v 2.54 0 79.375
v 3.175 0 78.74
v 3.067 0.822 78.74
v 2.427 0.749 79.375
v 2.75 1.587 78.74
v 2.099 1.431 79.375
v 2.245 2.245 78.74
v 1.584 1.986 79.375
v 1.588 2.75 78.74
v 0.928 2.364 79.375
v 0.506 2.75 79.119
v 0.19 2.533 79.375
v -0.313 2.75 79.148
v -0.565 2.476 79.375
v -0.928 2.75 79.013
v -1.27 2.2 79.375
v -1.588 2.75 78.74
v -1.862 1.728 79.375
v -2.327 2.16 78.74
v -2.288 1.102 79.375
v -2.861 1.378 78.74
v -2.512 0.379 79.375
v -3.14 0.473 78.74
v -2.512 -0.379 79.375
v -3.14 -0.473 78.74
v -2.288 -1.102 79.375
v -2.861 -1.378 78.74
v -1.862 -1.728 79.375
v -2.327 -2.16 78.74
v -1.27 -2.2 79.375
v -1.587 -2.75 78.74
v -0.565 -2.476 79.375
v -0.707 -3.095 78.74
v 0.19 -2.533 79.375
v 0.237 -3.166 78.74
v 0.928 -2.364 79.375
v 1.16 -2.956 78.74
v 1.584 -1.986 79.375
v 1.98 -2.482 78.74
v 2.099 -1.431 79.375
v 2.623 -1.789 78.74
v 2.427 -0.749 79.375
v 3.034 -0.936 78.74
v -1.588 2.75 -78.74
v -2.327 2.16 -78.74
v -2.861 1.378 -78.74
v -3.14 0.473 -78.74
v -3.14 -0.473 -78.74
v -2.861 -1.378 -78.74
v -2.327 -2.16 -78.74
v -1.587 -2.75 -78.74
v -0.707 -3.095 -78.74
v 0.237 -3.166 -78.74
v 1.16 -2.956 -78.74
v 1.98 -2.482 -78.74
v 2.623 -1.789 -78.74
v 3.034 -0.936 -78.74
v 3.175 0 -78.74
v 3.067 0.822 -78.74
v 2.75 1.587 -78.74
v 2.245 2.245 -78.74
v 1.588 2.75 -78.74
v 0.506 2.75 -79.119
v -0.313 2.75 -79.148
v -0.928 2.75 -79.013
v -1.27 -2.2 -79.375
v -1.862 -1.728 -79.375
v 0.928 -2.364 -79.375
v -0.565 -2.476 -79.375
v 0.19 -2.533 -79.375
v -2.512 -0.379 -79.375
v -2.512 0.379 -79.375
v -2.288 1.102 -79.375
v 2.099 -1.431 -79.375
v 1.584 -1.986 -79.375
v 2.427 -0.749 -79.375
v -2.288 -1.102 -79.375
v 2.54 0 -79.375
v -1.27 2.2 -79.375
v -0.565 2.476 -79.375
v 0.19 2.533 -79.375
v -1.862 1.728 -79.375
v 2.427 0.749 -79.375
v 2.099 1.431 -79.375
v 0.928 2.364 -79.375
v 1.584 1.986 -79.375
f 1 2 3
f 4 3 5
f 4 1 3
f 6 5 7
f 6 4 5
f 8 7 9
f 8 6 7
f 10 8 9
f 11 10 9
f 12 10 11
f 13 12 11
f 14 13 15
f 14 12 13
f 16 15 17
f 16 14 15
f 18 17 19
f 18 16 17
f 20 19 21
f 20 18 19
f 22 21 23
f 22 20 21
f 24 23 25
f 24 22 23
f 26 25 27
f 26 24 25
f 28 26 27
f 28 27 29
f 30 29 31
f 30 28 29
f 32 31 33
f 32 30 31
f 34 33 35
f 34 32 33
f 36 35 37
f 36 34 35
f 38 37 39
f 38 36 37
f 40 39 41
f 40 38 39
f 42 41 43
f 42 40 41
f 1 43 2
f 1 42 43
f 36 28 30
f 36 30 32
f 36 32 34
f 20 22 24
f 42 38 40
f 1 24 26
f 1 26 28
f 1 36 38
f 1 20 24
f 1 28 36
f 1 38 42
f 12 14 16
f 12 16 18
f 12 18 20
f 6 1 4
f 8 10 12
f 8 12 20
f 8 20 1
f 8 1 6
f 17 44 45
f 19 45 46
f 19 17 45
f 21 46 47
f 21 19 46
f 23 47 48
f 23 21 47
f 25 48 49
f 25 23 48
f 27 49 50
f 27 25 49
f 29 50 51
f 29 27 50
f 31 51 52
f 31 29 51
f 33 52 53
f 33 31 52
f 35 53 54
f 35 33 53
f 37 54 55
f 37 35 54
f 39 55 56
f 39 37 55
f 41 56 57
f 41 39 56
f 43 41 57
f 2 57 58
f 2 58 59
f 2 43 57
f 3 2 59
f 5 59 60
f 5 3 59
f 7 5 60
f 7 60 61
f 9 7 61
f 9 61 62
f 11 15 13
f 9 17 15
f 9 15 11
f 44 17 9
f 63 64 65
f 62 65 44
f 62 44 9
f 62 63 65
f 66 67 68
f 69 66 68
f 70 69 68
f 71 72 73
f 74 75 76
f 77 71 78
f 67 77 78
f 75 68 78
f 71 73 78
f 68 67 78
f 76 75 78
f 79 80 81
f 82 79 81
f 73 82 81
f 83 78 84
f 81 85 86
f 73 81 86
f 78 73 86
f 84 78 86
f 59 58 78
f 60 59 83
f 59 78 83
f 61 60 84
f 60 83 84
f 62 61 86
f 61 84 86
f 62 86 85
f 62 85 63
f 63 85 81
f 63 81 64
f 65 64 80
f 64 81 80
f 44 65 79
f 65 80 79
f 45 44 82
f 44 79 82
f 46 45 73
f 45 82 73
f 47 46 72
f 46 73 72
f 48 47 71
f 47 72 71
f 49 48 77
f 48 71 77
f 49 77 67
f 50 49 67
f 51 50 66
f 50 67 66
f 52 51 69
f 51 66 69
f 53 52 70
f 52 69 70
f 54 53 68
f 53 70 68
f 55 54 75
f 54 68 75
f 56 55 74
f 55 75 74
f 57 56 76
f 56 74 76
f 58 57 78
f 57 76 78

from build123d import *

# Parameters (mm, degrees)
SKETCH1_R           = 3.175
EXTRUDE1_DEPTH      = 79.375
CHAMFER1_SIZE       = 0.635
EXTRUDE7_DEPTH      = 80.375
EXTRUDE7_DEPTH_BACK = 80.375


with BuildPart() as part:
    # Sketch1 → Extrude1 (new body, symmetric)
    with BuildSketch(Plane.XY):
        Circle(SKETCH1_R)
    extrude(amount=EXTRUDE1_DEPTH, both=True)

    # Chamfer1
    chamfer1_edges = [part.edges().sort_by_distance(p)[0] for p in [
        (-3.175, 0, -79.375),
        (-3.175, 0, 79.375),
    ]]
    chamfer(chamfer1_edges, length=CHAMFER1_SIZE)

    # Sketch13 → Extrude7 (cut, two sides)
    with BuildSketch(Plane.XY) as extrude7_sk:
        with BuildLine():
            Line((-1.5875, 2.749630657), (1.5875, 2.749630657))
            ThreePointArc((1.5875, 2.749630657), (0, 3.175), (-1.5875, 2.749630657))
        make_face()
    extrude(amount=EXTRUDE7_DEPTH, mode=Mode.SUBTRACT)
    extrude(extrude7_sk.sketch, amount=-EXTRUDE7_DEPTH_BACK, mode=Mode.SUBTRACT)


solid = part.part
